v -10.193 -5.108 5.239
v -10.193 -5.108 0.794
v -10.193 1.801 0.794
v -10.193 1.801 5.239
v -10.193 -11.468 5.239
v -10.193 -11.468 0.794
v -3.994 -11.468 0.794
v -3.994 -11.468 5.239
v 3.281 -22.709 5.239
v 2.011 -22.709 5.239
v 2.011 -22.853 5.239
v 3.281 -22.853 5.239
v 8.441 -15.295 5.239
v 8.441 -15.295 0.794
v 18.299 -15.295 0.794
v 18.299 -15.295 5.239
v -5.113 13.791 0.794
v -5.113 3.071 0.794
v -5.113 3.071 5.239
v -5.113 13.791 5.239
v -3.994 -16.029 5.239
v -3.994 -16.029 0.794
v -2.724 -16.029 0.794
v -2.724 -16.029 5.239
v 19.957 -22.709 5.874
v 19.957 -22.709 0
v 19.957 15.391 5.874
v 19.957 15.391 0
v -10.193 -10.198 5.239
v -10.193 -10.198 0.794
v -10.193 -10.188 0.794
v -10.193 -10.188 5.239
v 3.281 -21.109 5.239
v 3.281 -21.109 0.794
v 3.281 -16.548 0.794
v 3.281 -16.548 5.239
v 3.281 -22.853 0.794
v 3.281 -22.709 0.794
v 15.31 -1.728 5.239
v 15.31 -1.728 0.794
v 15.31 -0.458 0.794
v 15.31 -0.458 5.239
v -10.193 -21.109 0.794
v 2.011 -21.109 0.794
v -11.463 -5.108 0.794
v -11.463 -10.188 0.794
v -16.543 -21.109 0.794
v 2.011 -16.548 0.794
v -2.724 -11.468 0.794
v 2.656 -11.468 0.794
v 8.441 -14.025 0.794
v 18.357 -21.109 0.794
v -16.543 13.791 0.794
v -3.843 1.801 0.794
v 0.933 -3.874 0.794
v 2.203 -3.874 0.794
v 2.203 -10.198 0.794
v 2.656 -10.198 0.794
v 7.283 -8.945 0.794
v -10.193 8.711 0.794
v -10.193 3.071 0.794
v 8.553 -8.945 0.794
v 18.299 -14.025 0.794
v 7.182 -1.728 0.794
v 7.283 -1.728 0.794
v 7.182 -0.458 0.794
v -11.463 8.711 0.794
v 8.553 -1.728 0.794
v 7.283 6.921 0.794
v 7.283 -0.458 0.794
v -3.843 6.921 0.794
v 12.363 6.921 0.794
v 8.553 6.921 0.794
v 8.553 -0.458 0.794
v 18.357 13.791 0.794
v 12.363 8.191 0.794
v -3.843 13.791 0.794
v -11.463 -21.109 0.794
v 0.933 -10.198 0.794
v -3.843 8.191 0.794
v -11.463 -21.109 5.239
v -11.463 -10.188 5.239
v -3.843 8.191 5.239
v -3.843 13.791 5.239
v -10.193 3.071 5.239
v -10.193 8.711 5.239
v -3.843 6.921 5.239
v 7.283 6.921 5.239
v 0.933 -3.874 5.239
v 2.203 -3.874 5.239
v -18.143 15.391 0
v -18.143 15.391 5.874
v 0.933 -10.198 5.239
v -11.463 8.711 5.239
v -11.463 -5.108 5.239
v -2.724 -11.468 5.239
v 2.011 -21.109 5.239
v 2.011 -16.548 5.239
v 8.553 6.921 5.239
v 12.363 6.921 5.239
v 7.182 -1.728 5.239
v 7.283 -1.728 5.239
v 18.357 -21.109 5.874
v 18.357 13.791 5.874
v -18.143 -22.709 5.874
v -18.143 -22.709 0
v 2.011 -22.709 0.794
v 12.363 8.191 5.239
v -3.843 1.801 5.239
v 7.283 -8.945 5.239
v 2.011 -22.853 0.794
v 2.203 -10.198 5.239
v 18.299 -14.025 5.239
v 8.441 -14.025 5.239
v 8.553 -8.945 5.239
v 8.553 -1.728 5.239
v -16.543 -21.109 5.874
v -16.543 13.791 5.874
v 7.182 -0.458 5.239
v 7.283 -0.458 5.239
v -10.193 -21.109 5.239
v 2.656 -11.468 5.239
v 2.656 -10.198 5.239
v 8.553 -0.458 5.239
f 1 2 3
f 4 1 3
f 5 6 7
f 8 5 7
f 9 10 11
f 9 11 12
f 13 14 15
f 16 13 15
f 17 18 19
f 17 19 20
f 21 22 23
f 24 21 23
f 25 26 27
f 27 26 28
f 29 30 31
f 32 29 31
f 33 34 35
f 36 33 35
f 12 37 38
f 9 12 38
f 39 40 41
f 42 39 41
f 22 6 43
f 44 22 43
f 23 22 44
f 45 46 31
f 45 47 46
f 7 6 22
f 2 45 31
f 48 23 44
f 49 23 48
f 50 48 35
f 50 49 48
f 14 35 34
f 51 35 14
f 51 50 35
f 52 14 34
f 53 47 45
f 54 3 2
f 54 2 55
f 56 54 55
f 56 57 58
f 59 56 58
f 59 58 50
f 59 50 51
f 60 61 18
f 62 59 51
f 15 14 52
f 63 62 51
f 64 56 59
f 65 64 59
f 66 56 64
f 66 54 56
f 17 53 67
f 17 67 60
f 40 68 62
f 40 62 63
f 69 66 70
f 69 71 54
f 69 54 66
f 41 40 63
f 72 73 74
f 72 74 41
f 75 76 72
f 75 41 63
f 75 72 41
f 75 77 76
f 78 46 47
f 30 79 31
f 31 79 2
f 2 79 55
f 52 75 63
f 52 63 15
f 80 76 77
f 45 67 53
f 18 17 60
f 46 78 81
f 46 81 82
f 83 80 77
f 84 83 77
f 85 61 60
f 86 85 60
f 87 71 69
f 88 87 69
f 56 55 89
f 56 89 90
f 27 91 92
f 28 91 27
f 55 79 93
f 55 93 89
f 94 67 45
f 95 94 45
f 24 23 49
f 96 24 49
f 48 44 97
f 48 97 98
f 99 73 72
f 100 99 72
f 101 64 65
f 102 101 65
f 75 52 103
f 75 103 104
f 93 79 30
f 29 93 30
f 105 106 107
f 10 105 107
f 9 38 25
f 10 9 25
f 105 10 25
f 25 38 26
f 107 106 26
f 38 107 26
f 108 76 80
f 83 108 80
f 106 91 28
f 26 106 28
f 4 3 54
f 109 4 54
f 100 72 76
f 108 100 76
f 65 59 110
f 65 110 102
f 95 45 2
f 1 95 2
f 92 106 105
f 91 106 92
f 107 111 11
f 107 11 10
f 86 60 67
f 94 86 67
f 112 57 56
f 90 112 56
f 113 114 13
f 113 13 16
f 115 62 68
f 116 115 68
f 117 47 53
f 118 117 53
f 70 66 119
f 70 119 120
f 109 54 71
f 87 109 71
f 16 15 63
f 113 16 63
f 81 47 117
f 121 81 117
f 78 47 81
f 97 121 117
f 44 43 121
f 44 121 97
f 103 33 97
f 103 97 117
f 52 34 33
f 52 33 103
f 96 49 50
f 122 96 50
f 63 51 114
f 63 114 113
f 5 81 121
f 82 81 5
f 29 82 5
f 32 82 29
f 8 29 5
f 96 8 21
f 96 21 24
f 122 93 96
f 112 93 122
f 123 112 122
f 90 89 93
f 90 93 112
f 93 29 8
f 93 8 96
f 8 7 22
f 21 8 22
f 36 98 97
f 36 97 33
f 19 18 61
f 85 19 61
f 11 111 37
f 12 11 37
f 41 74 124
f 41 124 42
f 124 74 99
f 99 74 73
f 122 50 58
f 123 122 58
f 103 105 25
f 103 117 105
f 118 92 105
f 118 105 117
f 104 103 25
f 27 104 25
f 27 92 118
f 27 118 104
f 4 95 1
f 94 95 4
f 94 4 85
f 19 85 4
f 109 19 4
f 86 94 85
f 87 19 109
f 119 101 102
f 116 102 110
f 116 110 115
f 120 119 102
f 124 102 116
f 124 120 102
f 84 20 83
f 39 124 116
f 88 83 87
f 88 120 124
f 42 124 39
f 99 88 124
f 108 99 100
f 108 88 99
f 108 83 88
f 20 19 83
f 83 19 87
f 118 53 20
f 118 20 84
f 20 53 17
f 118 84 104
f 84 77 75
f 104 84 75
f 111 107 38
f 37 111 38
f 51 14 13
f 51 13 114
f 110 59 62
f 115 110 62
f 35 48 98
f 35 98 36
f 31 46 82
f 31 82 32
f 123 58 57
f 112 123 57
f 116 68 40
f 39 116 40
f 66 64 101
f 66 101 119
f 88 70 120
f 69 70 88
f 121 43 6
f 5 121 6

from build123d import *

# Parameters (mm, degrees)
F0_W      = 38.1
F0_H      = 38.1
F1_DEPTH  = 0.79375
F2_W      = 38.1
F2_H      = 38.1
F2_W_2    = 34.8996
F2_H_2    = 34.8996
F3_DEPTH  = 5.08
F4_W      = 1.27
F4_H      = 10.9915577808
F4_H_2    = 10.7192572
F5_DEPTH  = 4.445
F7_W      = 1.27
F7_H      = 6.305353716
F9_DEPTH  = 4.445
F8_W      = 1.27
F8_H      = 7.127109261
F8_H_2    = 15.866300866
F8_W_2    = 9.8573208662
F8_H_3    = 1.27
F10_DEPTH = 4.445
F11_W     = 8.128
F11_H     = 1.27
F12_DEPTH = 4.445


# Not quite as in the source:
# - a feature names something its author has since deleted; it is built from what else it names


with BuildPart() as f1:
    # F0 (on Top) → F1 (new body)
    with BuildSketch(Plane.XY):
        with Locations((0.9067468345, -3.6591270581)):
            Rectangle(F0_W, F0_H)
    extrude(amount=F1_DEPTH)

    # F2 (on face) → F3 (join)
    with BuildSketch(Plane.XY.offset(0.79375)):
        with Locations((0.9067468345, -3.6591270581)):
            Rectangle(F2_W, F2_H)
        with Locations((0.9067468345, -3.6591270581)):
            Rectangle(F2_W_2, F2_H_2, mode=Mode.SUBTRACT)
    extrude(amount=F3_DEPTH)

    # F4 (on face) → F5 (join)
    with BuildSketch(Plane.XY.offset(0.79375)):
        with Locations((-10.8280531655, -15.6836010049)):
            Rectangle(F4_W, F4_H)
        Polygon((-11.4630531655, -5.1078221145), (-10.1930531655, -5.1078221145), (-10.1930531655, 1.8014254137), (-10.1930531655, 3.0714254137), (-10.1930531655, 8.7106729419), (-11.4630531655, 8.7106729419), align=None)
        Polygon((-10.1930531655, 3.0714254137), (-10.1930531655, 1.8014254137), (-3.8430531655, 1.8014254137), (-3.8430531655, 3.0714254137), (-5.1130531655, 3.0714254137), align=None)
        with Locations((-4.4780531655, 8.4310540137)):
            Rectangle(F4_W, F4_H_2)
    extrude(amount=F5_DEPTH)

    # F7 (on face) → F9 (join)
    with BuildSketch(Plane.XY.offset(0.79375)):
        Polygon((2.6555440854, -10.197567645), (-10.6428060681, -10.197567645), (-10.6428060681, -11.467567645), (-3.9936309913, -11.467567645), (-3.9936309913, -16.0289270581), (-2.7236309913, -16.0289270581), (-2.7236309913, -11.467567645), (2.6555440854, -11.467567645), align=None)
        with Locations((2.6458618774, -19.700244503)):
            Rectangle(F7_W, F7_H)
    extrude(amount=F9_DEPTH)

    # F8 (on face) → F10 (join)
    with BuildSketch(Plane.XY.offset(0.79375)):
        with Locations((1.5678320881, -7.4372278345)):
            Rectangle(F8_W, F8_H)
        Polygon((12.3628337599, 8.1913313339), (-4.464668509, 8.1913313339), (-4.464668509, 6.9213313339), (7.2828320881, 6.9213313339), (8.5528320881, 6.9213313339), (12.3628337599, 6.9213313339), align=None)
        with Locations((7.9178320881, -1.0118190991)):
            Rectangle(F8_W, F8_H_2)
        with Locations((13.370096651, -14.6599695321)):
            Rectangle(F8_W_2, F8_H_3)
    extrude(amount=F10_DEPTH)

    # F11 (on face) → F12 (join)
    with BuildSketch(Plane.XY.offset(0.79375)):
        with Locations((11.246104741, -1.0928286647)):
            Rectangle(F11_W, F11_H)
    extrude(amount=F12_DEPTH)


solid = f1.part
